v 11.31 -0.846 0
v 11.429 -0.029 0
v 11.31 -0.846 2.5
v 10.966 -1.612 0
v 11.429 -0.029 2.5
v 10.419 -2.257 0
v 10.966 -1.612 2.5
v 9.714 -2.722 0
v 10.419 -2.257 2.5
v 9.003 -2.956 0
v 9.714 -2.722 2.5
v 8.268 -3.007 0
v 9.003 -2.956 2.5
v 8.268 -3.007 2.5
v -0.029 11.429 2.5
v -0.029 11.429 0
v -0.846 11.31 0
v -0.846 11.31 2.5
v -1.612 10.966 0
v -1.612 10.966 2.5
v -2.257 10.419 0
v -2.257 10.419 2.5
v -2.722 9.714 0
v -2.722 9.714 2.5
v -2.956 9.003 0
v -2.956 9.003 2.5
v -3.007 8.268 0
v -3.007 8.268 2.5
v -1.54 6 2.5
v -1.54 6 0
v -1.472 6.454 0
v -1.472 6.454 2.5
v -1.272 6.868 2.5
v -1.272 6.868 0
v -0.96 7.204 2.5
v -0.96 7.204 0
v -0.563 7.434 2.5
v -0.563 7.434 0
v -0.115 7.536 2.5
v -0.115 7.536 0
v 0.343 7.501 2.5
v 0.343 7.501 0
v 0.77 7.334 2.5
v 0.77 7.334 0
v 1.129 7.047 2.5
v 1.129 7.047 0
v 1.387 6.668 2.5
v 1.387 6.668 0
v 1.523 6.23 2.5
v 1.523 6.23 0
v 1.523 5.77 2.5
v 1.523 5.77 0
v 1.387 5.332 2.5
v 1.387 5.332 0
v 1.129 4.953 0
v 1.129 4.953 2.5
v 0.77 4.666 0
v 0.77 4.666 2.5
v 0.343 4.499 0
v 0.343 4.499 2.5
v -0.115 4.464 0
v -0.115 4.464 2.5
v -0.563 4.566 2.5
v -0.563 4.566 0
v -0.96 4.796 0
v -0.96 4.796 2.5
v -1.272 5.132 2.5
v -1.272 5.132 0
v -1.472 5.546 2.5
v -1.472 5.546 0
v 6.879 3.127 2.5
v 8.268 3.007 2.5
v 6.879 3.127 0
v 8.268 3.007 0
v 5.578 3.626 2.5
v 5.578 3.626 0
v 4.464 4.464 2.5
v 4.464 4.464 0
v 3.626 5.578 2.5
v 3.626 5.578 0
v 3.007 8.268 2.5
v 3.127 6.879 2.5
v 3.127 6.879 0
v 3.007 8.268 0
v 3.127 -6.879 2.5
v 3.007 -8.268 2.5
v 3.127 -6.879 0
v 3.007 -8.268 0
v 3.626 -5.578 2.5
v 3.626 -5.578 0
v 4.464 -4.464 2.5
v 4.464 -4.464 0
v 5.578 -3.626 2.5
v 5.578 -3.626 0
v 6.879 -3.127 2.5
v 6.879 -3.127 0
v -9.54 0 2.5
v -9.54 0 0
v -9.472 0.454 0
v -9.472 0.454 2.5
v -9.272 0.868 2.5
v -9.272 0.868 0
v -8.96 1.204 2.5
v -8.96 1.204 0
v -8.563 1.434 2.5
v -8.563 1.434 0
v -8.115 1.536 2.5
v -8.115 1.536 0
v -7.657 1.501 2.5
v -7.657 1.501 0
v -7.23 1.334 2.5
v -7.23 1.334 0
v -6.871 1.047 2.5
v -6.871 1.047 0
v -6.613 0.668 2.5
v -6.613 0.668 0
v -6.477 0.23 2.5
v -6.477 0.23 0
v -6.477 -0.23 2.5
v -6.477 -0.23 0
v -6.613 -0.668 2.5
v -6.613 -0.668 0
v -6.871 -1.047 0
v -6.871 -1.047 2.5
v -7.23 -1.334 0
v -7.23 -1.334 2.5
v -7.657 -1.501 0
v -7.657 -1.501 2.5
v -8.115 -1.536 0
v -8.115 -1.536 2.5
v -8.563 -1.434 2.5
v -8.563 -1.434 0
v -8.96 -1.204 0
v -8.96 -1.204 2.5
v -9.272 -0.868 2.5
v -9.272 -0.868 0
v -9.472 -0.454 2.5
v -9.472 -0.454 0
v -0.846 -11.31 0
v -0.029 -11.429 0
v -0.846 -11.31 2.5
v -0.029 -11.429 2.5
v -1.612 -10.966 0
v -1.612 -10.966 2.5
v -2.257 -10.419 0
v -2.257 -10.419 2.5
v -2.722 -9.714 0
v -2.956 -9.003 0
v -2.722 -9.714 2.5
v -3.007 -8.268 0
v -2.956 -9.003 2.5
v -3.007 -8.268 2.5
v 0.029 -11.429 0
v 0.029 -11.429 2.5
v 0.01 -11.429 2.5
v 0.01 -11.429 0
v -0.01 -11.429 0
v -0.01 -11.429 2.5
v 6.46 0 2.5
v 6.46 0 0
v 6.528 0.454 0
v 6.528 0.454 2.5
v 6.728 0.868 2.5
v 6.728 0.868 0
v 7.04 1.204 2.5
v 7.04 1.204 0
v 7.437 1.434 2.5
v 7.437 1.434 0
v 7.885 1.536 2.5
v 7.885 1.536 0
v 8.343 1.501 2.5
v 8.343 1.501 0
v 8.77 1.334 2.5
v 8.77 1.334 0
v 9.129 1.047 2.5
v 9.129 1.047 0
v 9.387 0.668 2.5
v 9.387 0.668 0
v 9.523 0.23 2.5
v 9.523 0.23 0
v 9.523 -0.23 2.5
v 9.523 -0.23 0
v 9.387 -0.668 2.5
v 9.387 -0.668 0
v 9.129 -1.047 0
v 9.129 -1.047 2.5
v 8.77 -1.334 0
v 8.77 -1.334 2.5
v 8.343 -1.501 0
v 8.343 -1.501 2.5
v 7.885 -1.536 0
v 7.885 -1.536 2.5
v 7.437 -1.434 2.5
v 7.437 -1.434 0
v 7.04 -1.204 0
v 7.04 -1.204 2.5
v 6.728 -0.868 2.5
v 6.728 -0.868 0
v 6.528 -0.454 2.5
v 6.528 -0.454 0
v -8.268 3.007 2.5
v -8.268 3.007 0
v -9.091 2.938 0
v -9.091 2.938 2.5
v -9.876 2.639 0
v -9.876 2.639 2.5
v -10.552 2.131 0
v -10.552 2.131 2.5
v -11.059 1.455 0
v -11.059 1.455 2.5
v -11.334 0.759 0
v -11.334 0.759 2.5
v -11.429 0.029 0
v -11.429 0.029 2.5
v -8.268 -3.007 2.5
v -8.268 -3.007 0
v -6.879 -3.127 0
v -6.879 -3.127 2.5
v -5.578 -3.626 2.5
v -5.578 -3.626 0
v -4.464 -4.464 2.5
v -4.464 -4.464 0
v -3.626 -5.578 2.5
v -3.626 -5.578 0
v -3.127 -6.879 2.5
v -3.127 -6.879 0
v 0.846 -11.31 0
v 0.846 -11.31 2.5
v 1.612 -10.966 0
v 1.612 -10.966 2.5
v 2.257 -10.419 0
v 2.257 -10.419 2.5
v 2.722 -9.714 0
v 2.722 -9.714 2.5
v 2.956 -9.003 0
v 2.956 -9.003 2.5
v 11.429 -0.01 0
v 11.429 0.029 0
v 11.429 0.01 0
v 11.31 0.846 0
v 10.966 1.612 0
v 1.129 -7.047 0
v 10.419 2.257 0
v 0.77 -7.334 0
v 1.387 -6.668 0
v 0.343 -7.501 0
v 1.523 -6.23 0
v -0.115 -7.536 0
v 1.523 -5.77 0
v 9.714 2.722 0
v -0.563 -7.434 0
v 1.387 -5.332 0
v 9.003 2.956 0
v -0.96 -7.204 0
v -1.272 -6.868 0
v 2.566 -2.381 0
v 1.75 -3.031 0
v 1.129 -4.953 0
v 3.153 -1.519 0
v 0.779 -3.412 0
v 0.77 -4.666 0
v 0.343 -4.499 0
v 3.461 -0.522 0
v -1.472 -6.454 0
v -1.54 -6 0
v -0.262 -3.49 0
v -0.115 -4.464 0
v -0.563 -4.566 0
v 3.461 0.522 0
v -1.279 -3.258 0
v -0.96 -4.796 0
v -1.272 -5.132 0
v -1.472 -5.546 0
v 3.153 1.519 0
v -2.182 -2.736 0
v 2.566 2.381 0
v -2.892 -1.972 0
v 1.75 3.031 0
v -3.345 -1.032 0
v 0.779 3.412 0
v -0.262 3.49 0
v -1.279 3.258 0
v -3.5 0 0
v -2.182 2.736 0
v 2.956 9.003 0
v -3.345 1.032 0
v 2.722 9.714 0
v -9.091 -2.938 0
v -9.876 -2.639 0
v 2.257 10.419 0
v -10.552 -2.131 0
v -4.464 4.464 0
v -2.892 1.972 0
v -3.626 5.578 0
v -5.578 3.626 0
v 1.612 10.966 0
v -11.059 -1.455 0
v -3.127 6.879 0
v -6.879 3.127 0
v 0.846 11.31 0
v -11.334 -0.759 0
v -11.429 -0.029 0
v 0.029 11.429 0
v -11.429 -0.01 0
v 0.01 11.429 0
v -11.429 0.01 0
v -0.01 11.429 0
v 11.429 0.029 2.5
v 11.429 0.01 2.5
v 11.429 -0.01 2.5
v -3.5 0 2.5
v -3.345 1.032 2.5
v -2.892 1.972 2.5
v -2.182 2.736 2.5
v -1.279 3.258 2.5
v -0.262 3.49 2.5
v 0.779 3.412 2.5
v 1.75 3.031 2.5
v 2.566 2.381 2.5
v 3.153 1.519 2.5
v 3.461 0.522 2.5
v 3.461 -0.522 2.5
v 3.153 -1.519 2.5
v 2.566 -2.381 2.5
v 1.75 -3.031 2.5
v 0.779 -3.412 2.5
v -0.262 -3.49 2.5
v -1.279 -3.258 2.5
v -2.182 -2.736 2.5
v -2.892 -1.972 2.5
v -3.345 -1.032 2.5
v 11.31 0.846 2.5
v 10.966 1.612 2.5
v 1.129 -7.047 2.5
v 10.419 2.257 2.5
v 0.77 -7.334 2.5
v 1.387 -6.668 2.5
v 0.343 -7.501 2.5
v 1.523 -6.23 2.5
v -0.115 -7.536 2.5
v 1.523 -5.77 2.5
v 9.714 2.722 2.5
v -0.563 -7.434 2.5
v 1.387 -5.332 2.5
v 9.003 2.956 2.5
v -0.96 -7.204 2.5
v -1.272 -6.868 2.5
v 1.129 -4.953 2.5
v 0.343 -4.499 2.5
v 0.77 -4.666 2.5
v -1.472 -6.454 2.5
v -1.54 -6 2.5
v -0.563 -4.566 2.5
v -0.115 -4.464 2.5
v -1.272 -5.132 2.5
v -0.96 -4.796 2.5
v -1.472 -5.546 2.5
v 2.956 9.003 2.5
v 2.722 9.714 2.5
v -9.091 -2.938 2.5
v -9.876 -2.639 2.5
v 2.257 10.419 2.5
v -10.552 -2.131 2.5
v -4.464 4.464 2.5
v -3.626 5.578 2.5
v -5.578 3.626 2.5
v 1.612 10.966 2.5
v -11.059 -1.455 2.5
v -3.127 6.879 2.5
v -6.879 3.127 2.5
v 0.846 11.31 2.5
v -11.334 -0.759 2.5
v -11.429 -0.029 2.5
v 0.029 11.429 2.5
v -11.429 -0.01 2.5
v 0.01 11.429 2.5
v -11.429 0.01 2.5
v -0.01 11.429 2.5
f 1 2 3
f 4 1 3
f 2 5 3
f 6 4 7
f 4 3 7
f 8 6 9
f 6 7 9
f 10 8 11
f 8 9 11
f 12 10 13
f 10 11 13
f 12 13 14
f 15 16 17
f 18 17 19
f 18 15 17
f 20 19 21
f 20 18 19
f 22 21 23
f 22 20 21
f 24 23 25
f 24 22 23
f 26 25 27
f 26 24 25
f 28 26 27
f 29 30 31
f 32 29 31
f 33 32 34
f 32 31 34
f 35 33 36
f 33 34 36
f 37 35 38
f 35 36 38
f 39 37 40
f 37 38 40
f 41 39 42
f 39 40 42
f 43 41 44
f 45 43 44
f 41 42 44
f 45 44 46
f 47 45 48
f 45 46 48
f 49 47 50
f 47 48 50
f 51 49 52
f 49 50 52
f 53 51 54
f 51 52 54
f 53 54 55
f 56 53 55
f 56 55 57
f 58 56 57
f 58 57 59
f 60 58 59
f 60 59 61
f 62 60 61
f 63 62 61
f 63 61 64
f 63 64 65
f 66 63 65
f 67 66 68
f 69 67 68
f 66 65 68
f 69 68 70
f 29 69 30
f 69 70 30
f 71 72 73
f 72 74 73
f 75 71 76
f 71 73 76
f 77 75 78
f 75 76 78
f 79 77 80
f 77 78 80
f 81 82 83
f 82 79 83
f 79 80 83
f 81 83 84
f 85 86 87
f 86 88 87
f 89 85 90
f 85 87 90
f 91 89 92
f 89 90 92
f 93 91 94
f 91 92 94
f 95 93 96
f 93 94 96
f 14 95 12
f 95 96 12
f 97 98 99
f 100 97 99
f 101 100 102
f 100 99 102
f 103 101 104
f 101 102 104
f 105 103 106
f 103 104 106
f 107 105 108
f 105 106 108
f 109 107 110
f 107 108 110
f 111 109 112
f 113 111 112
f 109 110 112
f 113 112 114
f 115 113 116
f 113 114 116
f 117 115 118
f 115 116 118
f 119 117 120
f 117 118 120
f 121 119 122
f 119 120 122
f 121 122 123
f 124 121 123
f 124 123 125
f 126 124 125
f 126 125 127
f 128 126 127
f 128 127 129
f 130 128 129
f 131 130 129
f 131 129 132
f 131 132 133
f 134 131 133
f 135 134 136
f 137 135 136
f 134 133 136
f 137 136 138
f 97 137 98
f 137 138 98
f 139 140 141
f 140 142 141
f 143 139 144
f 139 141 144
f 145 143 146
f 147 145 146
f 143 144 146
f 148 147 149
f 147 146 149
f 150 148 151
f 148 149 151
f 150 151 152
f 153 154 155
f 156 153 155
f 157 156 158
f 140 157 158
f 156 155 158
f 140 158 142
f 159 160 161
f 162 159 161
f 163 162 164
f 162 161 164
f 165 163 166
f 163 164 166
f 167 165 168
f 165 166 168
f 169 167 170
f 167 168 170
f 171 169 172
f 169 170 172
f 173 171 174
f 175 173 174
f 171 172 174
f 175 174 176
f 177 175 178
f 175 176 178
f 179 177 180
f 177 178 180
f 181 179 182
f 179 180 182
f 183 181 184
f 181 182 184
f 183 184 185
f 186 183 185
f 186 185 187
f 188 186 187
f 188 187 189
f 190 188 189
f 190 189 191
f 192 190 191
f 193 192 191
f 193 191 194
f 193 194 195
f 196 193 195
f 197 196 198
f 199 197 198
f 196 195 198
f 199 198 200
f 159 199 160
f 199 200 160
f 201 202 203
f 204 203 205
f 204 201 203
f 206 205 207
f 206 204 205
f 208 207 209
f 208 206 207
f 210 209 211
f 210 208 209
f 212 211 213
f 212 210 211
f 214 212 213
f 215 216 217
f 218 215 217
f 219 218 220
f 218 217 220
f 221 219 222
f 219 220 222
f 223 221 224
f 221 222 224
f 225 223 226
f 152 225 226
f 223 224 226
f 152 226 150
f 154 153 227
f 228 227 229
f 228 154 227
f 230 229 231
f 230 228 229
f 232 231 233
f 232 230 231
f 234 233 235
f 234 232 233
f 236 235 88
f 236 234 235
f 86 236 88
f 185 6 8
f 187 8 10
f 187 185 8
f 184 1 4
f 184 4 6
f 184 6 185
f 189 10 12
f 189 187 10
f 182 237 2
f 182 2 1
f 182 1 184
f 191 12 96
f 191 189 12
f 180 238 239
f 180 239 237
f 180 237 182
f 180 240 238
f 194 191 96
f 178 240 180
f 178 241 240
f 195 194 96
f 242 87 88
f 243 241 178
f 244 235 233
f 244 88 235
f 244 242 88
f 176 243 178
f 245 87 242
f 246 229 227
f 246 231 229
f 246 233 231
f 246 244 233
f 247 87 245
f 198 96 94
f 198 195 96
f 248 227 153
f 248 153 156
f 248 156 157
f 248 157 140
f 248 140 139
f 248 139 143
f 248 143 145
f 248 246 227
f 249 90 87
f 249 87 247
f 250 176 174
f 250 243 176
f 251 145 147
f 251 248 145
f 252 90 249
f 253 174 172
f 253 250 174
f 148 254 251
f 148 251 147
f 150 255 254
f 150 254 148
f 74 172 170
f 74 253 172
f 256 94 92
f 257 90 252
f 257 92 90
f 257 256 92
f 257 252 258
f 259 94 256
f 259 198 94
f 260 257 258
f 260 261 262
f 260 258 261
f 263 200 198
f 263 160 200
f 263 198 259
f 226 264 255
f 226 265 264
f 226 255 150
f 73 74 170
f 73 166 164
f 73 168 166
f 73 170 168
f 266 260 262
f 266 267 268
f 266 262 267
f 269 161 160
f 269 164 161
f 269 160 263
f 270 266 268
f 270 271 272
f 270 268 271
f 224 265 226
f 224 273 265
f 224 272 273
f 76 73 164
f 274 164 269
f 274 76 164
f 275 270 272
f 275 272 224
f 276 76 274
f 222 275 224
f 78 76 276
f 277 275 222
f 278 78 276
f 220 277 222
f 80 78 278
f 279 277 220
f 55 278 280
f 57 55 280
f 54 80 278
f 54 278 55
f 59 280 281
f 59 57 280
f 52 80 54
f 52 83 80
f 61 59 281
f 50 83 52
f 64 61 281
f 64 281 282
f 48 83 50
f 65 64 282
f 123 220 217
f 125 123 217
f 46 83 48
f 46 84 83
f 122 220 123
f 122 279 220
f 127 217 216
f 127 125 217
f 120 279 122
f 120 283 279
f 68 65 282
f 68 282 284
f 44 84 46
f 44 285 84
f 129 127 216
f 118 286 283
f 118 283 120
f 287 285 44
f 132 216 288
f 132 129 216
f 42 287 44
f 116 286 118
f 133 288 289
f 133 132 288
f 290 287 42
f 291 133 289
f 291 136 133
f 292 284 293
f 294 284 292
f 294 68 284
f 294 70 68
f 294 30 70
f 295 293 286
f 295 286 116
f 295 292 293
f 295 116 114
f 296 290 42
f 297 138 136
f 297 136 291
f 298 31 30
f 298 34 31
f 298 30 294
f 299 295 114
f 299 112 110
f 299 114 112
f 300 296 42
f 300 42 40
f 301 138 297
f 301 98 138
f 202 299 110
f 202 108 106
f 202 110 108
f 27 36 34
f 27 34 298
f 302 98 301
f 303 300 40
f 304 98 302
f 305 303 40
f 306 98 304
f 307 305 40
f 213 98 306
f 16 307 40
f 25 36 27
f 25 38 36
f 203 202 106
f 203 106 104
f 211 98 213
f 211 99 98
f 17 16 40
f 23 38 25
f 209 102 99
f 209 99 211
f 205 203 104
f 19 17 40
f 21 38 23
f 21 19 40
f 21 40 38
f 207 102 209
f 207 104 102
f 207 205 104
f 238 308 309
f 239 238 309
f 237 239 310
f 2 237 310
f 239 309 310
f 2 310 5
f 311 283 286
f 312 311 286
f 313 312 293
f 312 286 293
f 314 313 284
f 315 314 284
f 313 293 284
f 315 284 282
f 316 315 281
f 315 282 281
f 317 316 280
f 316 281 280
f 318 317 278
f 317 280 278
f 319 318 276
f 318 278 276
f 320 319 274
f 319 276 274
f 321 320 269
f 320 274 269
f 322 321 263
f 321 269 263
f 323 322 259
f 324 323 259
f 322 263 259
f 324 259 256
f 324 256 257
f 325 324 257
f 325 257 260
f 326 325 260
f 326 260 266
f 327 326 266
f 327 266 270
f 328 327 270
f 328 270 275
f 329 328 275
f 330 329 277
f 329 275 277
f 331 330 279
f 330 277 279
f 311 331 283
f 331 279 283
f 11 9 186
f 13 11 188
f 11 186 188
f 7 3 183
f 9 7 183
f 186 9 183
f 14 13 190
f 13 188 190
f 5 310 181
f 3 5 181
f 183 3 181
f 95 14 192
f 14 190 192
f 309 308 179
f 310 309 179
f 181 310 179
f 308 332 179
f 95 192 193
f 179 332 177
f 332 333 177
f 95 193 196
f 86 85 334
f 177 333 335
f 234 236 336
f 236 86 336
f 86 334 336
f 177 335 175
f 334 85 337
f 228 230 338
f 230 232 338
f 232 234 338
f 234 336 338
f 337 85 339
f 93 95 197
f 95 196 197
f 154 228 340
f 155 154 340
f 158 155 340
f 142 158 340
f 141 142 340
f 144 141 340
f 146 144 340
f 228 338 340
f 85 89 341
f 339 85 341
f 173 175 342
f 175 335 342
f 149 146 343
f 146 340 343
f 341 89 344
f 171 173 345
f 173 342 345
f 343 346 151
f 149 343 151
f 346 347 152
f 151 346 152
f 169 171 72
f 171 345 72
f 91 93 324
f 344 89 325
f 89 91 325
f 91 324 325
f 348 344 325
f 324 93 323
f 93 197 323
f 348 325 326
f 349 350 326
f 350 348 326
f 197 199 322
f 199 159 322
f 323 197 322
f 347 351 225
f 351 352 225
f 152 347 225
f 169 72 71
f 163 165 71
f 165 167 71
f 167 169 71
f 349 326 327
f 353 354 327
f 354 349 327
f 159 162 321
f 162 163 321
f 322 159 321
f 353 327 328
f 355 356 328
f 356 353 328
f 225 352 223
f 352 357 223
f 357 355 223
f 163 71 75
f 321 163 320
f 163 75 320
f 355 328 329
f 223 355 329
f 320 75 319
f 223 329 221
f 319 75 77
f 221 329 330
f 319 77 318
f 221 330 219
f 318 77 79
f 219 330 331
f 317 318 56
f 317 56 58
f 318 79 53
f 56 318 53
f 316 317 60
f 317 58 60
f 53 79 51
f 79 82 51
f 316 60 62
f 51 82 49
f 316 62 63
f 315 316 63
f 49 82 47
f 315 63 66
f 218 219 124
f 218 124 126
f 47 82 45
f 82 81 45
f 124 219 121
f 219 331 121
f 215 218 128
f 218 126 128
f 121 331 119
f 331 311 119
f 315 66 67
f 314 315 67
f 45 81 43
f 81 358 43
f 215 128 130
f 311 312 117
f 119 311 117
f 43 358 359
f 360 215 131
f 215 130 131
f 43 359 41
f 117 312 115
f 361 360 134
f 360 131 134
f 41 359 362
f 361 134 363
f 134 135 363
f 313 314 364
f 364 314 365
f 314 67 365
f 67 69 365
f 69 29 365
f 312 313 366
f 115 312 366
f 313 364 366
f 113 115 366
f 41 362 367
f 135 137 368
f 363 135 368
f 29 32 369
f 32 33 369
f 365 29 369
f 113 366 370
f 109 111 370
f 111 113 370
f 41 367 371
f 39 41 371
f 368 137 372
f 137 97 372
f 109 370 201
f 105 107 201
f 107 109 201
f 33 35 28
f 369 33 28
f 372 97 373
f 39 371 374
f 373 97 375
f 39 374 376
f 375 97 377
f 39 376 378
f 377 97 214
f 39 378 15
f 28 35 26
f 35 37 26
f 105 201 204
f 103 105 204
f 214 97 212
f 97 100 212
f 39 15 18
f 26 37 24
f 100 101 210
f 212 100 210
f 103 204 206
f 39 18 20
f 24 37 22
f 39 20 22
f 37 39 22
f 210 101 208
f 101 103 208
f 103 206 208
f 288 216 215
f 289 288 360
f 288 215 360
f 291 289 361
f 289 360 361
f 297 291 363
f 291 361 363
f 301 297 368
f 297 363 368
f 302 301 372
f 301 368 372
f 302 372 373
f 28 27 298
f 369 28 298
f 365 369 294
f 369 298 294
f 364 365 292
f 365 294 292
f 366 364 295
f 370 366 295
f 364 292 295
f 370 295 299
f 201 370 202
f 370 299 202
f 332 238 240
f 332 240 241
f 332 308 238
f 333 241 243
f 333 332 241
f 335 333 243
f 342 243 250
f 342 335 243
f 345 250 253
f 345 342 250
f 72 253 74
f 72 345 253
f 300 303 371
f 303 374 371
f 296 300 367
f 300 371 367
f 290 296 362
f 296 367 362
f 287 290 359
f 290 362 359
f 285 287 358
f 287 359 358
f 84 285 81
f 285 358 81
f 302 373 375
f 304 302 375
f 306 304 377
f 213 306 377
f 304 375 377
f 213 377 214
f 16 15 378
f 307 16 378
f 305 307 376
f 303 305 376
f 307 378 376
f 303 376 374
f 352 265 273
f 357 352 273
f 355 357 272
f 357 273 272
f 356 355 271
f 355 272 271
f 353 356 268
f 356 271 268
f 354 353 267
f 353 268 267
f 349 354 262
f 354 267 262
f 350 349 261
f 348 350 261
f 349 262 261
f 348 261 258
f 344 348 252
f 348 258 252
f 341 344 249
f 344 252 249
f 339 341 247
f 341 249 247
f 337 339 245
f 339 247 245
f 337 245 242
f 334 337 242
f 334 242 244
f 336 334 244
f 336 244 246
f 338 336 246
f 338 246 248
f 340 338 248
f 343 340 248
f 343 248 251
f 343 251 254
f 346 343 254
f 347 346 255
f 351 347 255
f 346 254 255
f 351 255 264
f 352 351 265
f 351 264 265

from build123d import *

# Parameters (mm, degrees)
EXTRUDE_1_DEPTH     = 2.5
FILLET_1_R          = 5
FILLET_2_R          = 5
FILLET_3_R          = 5
FILLET_4_R          = 5
SKETCH_2_R          = 3.5
SKETCH_2_R_2        = 1.54
SKETCH_2_R_3        = 5
CUT_EXTRUDE_2_DEPTH = 2.5
FILLET_5_R          = 3
FILLET_6_R          = 3
FILLET_7_R          = 3
FILLET_8_R          = 3
FILLET_9_R          = 3
FILLET_10_R         = 3
FILLET_11_R         = 3
FILLET_12_R         = 3


with BuildPart() as part:
    # 草图1 → 凸台-拉伸1 (new body)
    with BuildSketch(Plane.XY):
        Polygon((0, 13.5), (13.5, 0), (0, -13.5), (-13.5, 0), align=None)
    extrude(amount=EXTRUDE_1_DEPTH)

    # 圆角1
    fillet_1_edges = [part.edges().sort_by_distance(p)[0] for p in [
        (13.5, 0, 1.25),
    ]]
    fillet(fillet_1_edges, radius=FILLET_1_R)

    # 圆角2
    fillet_2_edges = [part.edges().sort_by_distance(p)[0] for p in [
        (0, -13.5, 1.25),
    ]]
    fillet(fillet_2_edges, radius=FILLET_2_R)

    # 圆角3
    fillet_3_edges = [part.edges().sort_by_distance(p)[0] for p in [
        (-13.5, 0, 1.25),
    ]]
    fillet(fillet_3_edges, radius=FILLET_3_R)

    # 圆角4
    fillet_4_edges = [part.edges().sort_by_distance(p)[0] for p in [
        (0, 13.5, 1.25),
    ]]
    fillet(fillet_4_edges, radius=FILLET_4_R)

    # 草图2 → 切除-拉伸2 (cut)
    with BuildSketch(Plane(origin=(0, 0, 0), x_dir=(-1, 0, 0), z_dir=(0, 0, -1))):
        Circle(SKETCH_2_R)
        with Locations((0, -6)):
            Circle(SKETCH_2_R_2)
        with Locations((0, 6)):
            Circle(SKETCH_2_R_2)
        with Locations((8, 0)):
            Circle(SKETCH_2_R_2)
        with Locations((-8, 0)):
            Circle(SKETCH_2_R_2)
        with Locations((8, 8)):
            Circle(SKETCH_2_R_3)
        with Locations((8, -8)):
            Circle(SKETCH_2_R_3)
        with Locations((-8, -8)):
            Circle(SKETCH_2_R_3)
        with Locations((-8, 8)):
            Circle(SKETCH_2_R_3)
    extrude(amount=-CUT_EXTRUDE_2_DEPTH, mode=Mode.SUBTRACT)

    # 圆角5
    fillet_5_edges = [part.edges().sort_by_distance(p)[0] for p in [
        (3.442062075, -10.055529584, 1.25),
    ]]
    fillet(fillet_5_edges, radius=FILLET_5_R)

    # 圆角6
    fillet_6_edges = [part.edges().sort_by_distance(p)[0] for p in [
        (-3.442062075, -10.055529584, 1.25),
    ]]
    fillet(fillet_6_edges, radius=FILLET_6_R)

    # 圆角7
    fillet_7_edges = [part.edges().sort_by_distance(p)[0] for p in [
        (-10.055529584, -3.442062075, 1.25),
    ]]
    fillet(fillet_7_edges, radius=FILLET_7_R)

    # 圆角8
    fillet_8_edges = [part.edges().sort_by_distance(p)[0] for p in [
        (3.442062075, 10.055529584, 1.25),
    ]]
    fillet(fillet_8_edges, radius=FILLET_8_R)

    # 圆角9
    fillet_9_edges = [part.edges().sort_by_distance(p)[0] for p in [
        (-3.442062075, 10.055529584, 1.25),
    ]]
    fillet(fillet_9_edges, radius=FILLET_9_R)

    # 圆角10
    fillet_10_edges = [part.edges().sort_by_distance(p)[0] for p in [
        (-10.055529584, 3.442062075, 1.25),
    ]]
    fillet(fillet_10_edges, radius=FILLET_10_R)

    # 圆角11
    fillet_11_edges = [part.edges().sort_by_distance(p)[0] for p in [
        (10.055529584, -3.442062075, 1.25),
    ]]
    fillet(fillet_11_edges, radius=FILLET_11_R)

    # 圆角12
    fillet_12_edges = [part.edges().sort_by_distance(p)[0] for p in [
        (10.055529584, 3.442062075, 1.25),
    ]]
    fillet(fillet_12_edges, radius=FILLET_12_R)


solid = part.part
